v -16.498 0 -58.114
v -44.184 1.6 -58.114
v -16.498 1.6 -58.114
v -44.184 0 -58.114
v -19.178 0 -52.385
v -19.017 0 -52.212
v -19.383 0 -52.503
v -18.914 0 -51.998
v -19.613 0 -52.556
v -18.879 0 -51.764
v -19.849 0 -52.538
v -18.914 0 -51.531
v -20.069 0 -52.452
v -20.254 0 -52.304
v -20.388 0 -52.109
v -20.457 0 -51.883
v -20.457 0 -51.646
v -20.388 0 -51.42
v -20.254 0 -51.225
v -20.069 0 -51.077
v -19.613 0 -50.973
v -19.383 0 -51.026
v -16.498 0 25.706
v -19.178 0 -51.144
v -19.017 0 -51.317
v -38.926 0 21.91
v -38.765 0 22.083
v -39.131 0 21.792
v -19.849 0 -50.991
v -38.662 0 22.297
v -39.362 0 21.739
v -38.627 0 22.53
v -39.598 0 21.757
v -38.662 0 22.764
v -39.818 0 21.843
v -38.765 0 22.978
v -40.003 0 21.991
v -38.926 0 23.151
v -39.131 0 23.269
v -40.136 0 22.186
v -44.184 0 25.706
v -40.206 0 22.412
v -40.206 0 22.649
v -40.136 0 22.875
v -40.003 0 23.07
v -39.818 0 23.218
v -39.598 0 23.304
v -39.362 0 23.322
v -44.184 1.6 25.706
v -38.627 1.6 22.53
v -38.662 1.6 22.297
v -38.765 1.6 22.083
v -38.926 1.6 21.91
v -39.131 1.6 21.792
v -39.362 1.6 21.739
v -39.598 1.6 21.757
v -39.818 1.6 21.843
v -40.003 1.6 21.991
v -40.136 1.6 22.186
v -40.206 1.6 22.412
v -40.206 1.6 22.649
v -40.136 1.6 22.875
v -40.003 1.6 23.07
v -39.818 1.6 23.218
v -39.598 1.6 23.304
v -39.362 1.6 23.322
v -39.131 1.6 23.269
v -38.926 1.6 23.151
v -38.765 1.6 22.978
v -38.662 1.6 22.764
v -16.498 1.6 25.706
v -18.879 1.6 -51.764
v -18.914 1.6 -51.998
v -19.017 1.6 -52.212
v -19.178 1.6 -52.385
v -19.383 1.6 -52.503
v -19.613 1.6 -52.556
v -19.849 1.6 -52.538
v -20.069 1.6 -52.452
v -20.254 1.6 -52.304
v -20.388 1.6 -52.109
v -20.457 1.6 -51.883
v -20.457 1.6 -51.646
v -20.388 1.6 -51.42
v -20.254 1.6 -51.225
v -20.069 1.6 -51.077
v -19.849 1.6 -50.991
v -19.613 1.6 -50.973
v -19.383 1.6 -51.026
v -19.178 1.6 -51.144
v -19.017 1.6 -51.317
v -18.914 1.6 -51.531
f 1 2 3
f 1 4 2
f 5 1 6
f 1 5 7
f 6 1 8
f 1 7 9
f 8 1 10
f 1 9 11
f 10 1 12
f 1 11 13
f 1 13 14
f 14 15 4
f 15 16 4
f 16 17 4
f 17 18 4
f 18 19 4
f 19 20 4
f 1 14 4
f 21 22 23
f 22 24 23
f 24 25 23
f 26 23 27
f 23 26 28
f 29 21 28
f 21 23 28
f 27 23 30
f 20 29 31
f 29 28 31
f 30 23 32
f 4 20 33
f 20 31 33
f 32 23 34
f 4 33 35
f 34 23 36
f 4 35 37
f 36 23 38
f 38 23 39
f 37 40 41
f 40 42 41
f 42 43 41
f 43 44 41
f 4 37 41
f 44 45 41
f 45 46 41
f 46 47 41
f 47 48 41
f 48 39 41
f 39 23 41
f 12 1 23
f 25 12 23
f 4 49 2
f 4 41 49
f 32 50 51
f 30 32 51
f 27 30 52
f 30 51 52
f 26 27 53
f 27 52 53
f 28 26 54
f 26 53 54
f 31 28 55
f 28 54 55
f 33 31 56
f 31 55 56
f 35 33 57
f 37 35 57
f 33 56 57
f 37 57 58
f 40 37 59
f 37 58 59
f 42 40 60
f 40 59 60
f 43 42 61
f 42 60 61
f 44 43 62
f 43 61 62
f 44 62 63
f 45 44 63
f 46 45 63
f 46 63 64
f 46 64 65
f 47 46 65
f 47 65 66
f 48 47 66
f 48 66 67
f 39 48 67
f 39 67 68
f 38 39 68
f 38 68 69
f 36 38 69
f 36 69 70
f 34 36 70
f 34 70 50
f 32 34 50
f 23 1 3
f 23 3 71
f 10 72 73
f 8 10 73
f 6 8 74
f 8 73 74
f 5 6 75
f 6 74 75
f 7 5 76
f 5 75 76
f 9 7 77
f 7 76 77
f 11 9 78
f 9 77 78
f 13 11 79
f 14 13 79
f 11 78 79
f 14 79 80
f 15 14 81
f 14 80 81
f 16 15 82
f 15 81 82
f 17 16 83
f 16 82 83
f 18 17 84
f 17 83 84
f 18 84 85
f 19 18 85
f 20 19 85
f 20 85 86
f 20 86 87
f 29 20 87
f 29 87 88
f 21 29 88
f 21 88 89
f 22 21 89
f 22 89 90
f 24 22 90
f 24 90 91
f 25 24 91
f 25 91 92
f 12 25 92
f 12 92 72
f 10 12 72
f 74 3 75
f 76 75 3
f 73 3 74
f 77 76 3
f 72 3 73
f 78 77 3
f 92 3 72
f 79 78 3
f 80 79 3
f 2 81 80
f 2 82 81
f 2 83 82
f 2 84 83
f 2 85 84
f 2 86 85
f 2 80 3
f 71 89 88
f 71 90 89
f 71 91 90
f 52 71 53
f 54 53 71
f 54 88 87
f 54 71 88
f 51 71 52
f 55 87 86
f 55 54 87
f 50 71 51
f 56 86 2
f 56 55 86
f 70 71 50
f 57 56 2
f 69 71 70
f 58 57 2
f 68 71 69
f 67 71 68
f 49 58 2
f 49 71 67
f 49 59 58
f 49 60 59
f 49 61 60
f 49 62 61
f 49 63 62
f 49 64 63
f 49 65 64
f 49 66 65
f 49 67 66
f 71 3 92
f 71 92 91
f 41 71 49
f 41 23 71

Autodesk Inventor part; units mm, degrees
ref_plane "YZ Plane" through (0, 0, 0) normal (1, 0, 0) x (0, 1, 0)
ref_plane "XZ Plane" through (0, 0, 0) normal (0, 1, 0) x (-1, 0, 0)
ref_plane "XY Plane" through (0, 0, 0) normal (0, 0, 1) x (1, 0, 0)
sketch "Sketch1" plane through (0, 0, 0) normal (0, 1, 0) x (-1, 0, 0)
  line L0 (16.4975, 25.7055) -> (44.1835, 25.7055)
  line L1 (44.1835, 25.7055) -> (44.1835, -58.1145)
  line L2 (44.1835, -58.1145) -> (16.4975, -58.1145)
  line L3 (16.4975, -58.1145) -> (16.4975, 25.7055)
  point P0 (0, 0)
  dimension "d0" = 27.686
  dimension "d1" = 83.82
extrude "Extrusion1" add sketch "Sketch1" along normal blind 1.6
sketch "Sketch2" plane through (0, 1.6, 0) normal (0, 1, 0) x (1, 0, 0)
  line L0 (-44.1835, -25.7055) -> (-16.4975, -25.7055) projected
  line L1 (-16.4975, -25.7055) -> (-16.4975, 58.1145) projected
  line L2 (-16.4975, 58.1145) -> (-44.1835, 58.1145) projected
  line L3 (-44.1835, 58.1145) -> (-44.1835, -25.7055) projected
  circle A0 centre (-19.6725, 51.7645) radius 0.7937
  circle A1 centre (-39.421, -22.5305) radius 0.7938
  point P0 (0, 0)
  dimension "d4" = 1.5875
  dimension "d5" = 1.5875
  dimension "d6" = 3.175
  dimension "d7" = 4.7625
  dimension "d8" = 6.35
  dimension "d9" = 3.175
extrude "Extrusion2" cut sketch "Sketch2" against normal up to next contours A0 | A1
properties part number "Yagi_Board"
